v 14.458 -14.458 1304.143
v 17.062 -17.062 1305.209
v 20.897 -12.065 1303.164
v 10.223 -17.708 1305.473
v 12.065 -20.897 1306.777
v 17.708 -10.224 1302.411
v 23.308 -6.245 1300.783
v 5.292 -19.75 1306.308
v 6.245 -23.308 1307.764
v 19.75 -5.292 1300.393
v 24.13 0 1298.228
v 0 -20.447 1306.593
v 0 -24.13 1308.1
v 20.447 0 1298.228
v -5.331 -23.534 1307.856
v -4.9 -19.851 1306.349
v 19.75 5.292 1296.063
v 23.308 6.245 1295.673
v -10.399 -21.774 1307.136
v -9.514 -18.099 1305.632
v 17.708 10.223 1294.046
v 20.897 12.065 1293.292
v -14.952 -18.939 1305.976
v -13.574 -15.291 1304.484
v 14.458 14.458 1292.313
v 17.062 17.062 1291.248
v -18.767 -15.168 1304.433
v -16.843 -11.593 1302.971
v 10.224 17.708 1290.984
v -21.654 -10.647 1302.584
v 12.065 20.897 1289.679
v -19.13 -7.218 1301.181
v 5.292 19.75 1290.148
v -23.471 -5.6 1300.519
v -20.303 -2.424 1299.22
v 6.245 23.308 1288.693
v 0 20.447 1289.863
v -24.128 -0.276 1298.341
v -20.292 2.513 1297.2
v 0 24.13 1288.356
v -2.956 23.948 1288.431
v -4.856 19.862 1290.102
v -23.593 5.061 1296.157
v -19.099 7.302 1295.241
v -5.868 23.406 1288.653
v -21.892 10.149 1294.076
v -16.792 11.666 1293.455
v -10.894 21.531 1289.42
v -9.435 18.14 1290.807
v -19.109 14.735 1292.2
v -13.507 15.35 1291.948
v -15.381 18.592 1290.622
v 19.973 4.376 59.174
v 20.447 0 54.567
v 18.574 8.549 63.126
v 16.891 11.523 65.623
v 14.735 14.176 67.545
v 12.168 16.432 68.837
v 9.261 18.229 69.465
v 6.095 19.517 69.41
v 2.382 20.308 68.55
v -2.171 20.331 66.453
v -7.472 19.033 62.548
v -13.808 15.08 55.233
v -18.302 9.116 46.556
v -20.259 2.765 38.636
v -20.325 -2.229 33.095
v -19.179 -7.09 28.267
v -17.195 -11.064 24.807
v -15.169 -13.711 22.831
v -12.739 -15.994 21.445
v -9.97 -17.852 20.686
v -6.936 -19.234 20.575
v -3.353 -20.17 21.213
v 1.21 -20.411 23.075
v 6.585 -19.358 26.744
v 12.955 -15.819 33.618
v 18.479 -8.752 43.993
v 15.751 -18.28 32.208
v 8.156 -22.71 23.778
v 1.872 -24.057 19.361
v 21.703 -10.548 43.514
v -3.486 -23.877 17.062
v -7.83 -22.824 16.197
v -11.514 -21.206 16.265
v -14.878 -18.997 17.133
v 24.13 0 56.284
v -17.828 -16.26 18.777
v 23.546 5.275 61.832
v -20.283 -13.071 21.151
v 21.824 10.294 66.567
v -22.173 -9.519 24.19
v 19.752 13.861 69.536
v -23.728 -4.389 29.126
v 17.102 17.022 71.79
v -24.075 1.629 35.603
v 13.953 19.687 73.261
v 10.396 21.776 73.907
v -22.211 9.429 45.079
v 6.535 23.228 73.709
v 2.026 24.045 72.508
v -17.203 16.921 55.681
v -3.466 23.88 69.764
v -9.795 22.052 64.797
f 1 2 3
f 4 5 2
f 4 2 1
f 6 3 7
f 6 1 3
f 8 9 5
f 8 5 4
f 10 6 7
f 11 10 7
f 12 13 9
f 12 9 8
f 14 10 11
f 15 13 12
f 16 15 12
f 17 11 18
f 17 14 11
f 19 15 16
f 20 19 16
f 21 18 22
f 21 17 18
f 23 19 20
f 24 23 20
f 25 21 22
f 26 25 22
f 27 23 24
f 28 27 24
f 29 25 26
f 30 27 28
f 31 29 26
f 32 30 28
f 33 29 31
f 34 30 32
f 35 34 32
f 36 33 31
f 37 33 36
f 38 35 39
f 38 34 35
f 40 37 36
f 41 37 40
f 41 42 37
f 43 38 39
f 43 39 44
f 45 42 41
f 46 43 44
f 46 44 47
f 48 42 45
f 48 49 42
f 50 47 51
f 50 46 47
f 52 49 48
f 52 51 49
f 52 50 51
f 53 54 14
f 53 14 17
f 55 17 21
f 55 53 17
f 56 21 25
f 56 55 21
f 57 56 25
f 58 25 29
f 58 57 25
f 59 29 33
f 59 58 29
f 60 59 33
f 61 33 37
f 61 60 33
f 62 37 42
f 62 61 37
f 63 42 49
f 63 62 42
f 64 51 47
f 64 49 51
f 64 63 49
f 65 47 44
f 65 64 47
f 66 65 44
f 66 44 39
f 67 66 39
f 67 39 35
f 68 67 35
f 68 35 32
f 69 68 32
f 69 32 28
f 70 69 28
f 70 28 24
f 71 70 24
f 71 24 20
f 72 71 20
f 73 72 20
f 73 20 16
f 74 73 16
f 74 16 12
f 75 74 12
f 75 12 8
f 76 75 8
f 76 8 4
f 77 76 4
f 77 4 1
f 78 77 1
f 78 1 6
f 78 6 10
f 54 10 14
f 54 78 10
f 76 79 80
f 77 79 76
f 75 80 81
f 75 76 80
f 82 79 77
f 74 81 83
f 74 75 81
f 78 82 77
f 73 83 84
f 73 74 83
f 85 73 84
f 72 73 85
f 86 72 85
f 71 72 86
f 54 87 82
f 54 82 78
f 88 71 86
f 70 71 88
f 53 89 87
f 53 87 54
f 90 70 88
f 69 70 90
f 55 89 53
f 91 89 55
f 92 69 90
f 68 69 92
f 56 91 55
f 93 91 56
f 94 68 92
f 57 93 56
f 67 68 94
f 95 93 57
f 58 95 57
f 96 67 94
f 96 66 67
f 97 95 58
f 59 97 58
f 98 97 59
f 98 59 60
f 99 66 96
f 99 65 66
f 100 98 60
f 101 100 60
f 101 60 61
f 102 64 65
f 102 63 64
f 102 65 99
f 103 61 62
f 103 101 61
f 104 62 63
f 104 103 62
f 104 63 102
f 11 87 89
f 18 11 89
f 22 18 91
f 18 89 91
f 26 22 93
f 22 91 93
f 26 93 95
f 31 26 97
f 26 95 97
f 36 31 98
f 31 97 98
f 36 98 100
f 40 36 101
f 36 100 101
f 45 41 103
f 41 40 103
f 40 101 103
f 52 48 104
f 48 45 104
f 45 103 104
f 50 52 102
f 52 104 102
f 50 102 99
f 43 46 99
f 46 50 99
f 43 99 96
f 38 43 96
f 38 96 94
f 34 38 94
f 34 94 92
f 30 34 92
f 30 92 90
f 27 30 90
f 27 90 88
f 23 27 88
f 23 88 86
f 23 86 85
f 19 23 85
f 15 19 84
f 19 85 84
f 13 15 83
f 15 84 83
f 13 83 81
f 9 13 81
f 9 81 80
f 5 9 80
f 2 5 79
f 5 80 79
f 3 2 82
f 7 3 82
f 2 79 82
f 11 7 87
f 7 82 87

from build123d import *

# Parameters (mm, degrees)
F0_R          = 24.13
F0_R_2        = 20.447
F1_DEPTH      = 1308.1
F3_DEPTH      = 24.131
F3_DEPTH_BACK = 24.131
F5_DEPTH      = 24.131
F5_DEPTH_BACK = 24.131
F8_W          = 230.4114792496
F8_H          = 177.8236068785
F9_DEPTH      = 25.4
F9_DEPTH_BACK = 20.32


with BuildPart() as f1:
    # F0 (on Top) → F1 (new body)
    with BuildSketch(Plane.XY):
        Circle(F0_R)
        Circle(F0_R_2, mode=Mode.SUBTRACT)
    extrude(amount=F1_DEPTH)

    # F2 (on Right) → F3 (cut, two sides)
    with BuildSketch(Plane.YZ) as f3_sk:
        Polygon((24.13, 1288.3563127231), (24.13, 1308.1), (-24.13, 1308.1), align=None)
    extrude(amount=-F3_DEPTH, mode=Mode.SUBTRACT)
    extrude(f3_sk.sketch, amount=F3_DEPTH_BACK, mode=Mode.SUBTRACT)

    # F4 (on Front) → F5 (cut, two sides)
    with BuildSketch(Plane.XZ) as f5_sk:
        Polygon((-28.575, 0), (28.575, 0), (28.575, 26.6494826636), align=None)
    extrude(amount=F5_DEPTH, mode=Mode.SUBTRACT)
    extrude(f5_sk.sketch, amount=-F5_DEPTH_BACK, mode=Mode.SUBTRACT)

    # F8 (on line) → F9 (cut, two sides)
    with BuildSketch(Plane(origin=(-2.5518360133, -6.0381584146, 5.4724299905), x_dir=(-0.9543044076, 0.2214273865, -0.2006813646), z_dir=(0.2988362387, 0.7071067812, -0.6408563821))) as f9_sk:
        with Locations((9.1961668804, 17.1195510775)):
            Rectangle(F8_W, F8_H)
    extrude(amount=F9_DEPTH, mode=Mode.SUBTRACT)
    extrude(f9_sk.sketch, amount=-F9_DEPTH_BACK, mode=Mode.SUBTRACT)


solid = f1.part
